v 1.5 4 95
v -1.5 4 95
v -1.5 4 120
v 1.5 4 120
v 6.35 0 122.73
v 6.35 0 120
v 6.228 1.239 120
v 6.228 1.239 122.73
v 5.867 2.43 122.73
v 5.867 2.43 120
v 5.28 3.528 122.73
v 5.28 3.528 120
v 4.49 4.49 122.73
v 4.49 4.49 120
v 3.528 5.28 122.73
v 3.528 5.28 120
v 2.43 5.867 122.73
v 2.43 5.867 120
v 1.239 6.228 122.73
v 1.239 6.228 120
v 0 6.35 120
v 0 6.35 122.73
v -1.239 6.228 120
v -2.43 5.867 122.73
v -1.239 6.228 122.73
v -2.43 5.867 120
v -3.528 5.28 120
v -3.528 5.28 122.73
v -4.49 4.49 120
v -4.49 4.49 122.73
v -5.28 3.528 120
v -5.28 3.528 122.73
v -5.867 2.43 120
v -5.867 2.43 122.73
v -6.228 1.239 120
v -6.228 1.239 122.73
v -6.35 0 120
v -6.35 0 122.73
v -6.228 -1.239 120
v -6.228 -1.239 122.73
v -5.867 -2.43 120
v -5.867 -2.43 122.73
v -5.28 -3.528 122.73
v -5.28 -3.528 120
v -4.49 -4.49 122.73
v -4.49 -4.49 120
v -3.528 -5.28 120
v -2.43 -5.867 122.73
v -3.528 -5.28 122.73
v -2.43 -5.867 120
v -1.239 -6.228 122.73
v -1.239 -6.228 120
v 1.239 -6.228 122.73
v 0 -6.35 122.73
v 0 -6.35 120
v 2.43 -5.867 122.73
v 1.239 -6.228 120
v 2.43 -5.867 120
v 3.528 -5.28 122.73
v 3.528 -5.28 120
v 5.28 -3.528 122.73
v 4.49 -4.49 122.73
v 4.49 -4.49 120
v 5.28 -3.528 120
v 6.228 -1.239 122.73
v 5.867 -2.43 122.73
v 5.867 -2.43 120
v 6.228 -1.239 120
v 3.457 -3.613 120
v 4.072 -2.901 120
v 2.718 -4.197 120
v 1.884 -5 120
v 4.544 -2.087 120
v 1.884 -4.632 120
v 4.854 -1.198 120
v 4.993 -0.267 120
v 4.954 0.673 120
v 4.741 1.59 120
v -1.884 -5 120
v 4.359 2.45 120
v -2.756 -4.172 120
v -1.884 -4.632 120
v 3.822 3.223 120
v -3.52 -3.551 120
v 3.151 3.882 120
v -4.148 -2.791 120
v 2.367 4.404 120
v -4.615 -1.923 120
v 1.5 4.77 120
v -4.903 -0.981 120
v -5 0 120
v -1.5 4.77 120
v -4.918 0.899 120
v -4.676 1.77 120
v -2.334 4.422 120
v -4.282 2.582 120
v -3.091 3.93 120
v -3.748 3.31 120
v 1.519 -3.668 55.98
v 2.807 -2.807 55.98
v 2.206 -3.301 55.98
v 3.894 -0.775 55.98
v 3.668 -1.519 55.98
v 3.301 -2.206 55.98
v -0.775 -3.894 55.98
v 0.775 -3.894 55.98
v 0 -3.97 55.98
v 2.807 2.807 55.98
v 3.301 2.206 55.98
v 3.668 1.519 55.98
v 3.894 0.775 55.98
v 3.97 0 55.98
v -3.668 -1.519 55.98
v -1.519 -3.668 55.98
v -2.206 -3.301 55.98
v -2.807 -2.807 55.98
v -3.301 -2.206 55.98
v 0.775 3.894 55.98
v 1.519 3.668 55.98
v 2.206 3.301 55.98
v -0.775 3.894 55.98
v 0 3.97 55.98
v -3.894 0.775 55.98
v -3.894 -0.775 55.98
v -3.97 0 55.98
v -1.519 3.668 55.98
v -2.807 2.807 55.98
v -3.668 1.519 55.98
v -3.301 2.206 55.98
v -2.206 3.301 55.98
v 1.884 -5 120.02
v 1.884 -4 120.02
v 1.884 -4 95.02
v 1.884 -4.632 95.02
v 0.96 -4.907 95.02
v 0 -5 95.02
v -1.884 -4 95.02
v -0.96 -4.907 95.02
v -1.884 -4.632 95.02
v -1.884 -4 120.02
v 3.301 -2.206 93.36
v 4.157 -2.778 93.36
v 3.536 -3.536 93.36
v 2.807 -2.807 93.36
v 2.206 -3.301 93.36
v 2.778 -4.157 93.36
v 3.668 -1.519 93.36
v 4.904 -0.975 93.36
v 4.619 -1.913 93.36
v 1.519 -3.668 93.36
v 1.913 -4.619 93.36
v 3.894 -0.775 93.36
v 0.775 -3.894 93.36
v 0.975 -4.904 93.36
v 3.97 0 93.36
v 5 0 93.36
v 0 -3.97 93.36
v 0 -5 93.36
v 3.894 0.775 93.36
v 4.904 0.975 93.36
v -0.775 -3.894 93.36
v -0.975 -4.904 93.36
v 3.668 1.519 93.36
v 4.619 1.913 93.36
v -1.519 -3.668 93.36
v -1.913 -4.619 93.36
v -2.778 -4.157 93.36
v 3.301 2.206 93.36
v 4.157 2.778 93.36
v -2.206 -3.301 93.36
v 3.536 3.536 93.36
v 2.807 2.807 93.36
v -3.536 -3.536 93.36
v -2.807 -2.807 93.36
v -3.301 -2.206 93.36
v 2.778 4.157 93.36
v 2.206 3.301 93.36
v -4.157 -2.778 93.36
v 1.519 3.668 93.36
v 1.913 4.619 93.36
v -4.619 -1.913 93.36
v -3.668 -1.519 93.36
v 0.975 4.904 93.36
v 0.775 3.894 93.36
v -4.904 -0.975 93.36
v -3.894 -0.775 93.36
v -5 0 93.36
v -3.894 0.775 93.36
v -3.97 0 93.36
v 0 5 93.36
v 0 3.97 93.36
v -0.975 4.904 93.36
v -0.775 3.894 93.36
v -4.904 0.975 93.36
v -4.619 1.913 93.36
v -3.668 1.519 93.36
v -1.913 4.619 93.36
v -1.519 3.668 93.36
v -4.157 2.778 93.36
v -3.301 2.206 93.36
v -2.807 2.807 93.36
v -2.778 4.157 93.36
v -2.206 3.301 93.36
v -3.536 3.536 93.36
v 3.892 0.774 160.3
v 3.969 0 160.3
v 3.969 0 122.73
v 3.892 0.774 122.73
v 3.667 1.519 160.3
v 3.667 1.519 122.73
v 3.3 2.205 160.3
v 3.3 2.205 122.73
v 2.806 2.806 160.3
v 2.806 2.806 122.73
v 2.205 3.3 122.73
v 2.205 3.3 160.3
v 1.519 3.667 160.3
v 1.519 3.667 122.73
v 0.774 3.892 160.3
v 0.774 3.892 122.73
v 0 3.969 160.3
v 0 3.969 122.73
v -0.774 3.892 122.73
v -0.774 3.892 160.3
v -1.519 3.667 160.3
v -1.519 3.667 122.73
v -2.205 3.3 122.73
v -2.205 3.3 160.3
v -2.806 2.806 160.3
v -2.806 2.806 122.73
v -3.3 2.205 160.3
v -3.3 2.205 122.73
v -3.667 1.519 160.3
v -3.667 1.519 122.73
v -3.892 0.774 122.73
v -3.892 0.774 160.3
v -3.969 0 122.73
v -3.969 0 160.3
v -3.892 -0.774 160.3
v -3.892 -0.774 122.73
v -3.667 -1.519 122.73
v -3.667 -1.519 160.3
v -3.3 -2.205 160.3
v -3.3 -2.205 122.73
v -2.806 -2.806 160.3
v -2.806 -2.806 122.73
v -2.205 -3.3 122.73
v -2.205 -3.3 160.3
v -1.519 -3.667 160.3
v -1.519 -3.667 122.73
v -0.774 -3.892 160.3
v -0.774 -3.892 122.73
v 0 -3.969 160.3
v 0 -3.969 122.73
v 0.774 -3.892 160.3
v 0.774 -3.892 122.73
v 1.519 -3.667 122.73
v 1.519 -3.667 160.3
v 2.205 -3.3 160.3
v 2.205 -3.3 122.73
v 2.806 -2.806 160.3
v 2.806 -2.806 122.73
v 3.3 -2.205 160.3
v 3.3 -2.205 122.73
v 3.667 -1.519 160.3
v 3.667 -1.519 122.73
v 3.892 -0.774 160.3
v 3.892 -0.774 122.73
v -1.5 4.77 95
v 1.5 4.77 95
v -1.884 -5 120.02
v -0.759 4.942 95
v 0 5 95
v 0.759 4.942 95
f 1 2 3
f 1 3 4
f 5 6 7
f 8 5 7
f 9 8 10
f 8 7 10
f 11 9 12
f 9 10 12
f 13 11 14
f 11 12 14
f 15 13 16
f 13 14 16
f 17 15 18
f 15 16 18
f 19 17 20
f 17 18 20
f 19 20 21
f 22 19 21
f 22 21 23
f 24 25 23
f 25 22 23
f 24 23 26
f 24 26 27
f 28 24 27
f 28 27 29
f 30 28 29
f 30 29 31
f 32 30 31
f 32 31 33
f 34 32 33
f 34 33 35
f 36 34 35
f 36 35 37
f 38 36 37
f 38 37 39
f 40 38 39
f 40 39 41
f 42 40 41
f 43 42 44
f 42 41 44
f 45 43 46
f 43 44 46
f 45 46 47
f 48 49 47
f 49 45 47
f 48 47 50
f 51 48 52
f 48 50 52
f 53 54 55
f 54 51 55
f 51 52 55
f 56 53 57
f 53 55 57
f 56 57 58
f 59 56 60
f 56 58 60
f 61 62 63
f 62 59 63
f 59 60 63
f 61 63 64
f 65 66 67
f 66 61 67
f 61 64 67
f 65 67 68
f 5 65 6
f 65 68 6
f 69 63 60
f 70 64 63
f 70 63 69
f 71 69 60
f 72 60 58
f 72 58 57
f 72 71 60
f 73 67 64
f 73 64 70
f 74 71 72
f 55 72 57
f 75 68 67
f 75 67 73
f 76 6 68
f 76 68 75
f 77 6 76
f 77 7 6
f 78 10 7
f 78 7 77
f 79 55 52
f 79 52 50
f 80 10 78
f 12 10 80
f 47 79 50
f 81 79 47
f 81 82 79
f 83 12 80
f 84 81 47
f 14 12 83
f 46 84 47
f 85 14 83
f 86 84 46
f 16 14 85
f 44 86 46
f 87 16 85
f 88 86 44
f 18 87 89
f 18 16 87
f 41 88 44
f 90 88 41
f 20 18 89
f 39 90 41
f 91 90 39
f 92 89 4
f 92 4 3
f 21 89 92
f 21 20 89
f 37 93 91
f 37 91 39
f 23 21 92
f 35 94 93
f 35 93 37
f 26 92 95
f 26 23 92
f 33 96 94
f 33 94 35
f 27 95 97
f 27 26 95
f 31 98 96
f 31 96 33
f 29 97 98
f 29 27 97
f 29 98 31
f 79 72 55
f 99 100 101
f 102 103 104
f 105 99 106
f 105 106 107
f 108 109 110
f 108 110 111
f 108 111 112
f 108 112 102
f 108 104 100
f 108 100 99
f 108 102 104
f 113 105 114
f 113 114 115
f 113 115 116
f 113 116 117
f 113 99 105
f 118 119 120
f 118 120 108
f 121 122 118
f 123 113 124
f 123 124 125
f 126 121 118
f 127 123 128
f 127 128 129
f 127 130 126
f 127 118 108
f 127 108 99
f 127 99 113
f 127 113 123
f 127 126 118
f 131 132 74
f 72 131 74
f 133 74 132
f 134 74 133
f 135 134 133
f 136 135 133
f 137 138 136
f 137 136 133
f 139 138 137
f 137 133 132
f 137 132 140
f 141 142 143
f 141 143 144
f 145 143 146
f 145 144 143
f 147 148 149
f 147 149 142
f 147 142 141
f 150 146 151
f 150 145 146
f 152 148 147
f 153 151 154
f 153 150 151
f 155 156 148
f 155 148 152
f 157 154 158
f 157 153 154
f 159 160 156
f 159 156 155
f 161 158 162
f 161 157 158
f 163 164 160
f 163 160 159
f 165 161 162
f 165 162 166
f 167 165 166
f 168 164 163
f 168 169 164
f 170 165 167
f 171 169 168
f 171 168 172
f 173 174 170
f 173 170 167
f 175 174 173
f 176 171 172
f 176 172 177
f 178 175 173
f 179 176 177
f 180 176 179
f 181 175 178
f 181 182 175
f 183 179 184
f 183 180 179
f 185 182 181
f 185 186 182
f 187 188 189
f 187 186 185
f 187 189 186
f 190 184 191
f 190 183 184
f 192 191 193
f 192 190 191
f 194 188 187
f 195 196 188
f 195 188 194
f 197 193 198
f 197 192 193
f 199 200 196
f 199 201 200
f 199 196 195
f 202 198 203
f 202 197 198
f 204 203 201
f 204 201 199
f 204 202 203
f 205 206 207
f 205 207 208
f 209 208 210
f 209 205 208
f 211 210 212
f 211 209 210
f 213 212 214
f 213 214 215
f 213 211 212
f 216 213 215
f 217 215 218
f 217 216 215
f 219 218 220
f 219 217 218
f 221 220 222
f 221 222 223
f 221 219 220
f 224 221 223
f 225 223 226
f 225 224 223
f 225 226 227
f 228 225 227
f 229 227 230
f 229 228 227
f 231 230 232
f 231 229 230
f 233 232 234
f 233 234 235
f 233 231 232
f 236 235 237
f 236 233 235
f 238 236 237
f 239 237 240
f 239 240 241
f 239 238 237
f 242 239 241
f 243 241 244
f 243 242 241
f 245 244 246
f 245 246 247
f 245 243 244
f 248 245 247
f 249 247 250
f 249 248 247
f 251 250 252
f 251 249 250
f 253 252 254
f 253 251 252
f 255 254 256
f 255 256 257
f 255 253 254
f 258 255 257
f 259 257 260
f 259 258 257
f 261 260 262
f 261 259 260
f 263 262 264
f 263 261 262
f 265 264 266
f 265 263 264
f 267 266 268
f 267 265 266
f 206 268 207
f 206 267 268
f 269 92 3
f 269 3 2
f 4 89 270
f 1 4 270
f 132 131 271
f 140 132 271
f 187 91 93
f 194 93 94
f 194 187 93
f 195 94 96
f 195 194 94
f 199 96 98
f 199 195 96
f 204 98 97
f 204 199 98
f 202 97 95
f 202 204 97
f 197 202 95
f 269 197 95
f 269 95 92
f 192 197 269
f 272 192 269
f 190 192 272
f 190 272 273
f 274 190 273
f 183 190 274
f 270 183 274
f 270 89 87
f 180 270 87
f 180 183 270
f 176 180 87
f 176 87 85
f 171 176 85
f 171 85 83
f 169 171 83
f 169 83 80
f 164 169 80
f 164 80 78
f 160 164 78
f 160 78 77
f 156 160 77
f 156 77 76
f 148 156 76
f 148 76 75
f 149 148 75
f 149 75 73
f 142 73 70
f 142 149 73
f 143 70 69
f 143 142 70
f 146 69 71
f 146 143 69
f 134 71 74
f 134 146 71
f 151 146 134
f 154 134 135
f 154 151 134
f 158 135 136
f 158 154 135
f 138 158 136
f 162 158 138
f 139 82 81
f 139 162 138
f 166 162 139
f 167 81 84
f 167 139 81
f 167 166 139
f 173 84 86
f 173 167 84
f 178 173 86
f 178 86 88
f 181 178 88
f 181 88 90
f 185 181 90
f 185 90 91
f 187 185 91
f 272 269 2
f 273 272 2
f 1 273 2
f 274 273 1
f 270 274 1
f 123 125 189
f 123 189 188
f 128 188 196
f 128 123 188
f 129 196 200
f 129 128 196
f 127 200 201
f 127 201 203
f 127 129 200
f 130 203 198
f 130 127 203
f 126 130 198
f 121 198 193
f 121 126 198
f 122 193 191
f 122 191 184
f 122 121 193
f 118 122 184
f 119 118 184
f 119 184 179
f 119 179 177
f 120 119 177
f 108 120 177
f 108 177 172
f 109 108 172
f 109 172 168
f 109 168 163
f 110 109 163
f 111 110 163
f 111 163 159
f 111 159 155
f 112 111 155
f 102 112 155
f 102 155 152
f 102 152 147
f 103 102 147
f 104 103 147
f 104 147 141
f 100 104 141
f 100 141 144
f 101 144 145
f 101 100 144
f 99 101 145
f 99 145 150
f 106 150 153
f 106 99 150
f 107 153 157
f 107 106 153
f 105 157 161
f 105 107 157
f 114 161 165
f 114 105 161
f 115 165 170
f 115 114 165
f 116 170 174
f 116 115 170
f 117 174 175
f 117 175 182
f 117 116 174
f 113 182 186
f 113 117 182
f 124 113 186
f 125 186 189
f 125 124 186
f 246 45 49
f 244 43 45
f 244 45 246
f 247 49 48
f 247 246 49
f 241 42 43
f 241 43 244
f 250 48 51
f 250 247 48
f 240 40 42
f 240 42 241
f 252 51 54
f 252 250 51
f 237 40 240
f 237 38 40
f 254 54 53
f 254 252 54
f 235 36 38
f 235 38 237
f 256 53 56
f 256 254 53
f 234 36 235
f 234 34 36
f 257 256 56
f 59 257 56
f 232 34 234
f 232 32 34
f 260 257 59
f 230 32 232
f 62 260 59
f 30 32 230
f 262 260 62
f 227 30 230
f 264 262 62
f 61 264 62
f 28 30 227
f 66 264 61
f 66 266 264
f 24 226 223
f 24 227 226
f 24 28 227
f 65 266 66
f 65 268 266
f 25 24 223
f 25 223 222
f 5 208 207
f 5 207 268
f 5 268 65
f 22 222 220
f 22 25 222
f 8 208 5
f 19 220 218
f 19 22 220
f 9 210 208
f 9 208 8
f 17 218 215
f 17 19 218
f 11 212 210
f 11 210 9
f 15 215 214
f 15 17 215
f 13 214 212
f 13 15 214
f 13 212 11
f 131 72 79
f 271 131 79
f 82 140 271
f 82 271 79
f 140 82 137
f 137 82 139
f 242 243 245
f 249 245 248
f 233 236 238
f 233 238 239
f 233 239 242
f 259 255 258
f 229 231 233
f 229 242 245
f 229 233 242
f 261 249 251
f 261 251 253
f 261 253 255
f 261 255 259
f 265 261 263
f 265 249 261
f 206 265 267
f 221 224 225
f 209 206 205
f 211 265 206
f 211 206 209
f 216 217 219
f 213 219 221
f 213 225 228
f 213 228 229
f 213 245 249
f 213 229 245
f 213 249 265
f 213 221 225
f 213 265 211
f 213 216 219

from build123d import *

# Parameters (mm, degrees)
SKETCH1_R           = 6.35
BOSS_EXTRUDE1_DEPTH = 160.3
SKETCH3_OUTSIDE_W   = 46.96
SKETCH3_OUTSIDE_H   = 46.96
SKETCH3_OUTSIDE_R   = 5
CUT_EXTRUDE2_DEPTH  = 120
SKETCH4_OUTSIDE_W   = 46.96
SKETCH4_OUTSIDE_H   = 46.96
SKETCH4_OUTSIDE_R   = 3.96875
CUT_EXTRUDE3_DEPTH  = 37.57
SKETCH5_OUTSIDE_W   = 46.96
SKETCH5_OUTSIDE_H   = 46.96
SKETCH5_OUTSIDE_R   = 3.97
CUT_EXTRUDE4_DEPTH  = 93.36
SKETCH9_W           = 3
SKETCH9_H           = 25
CUT_EXTRUDE6_DEPTH  = 1
SKETCH11_W          = 3.767354336
SKETCH11_H          = 25
CUT_EXTRUDE7_DEPTH  = 1
SKETCH12_R          = 15.914705016
CUT_EXTRUDE8_DEPTH  = 55.98


with BuildPart() as part:
    # Sketch1 → Boss-Extrude1 (new body)
    with BuildSketch(Plane.XY):
        Circle(SKETCH1_R)
    extrude(amount=BOSS_EXTRUDE1_DEPTH)

    # Sketch3 outside → Cut-Extrude2 (cut)
    with BuildSketch(Plane(origin=(0, 0, 0), x_dir=(-1, 0, 0), z_dir=(0, 0, -1))):
        Rectangle(SKETCH3_OUTSIDE_W, SKETCH3_OUTSIDE_H)
        Circle(SKETCH3_OUTSIDE_R, mode=Mode.SUBTRACT)
    extrude(amount=-CUT_EXTRUDE2_DEPTH, mode=Mode.SUBTRACT)

    # Sketch4 outside → Cut-Extrude3 (cut)
    with BuildSketch(Plane.XY.offset(160.3)):
        Rectangle(SKETCH4_OUTSIDE_W, SKETCH4_OUTSIDE_H)
        Circle(SKETCH4_OUTSIDE_R, mode=Mode.SUBTRACT)
    extrude(amount=-CUT_EXTRUDE3_DEPTH, mode=Mode.SUBTRACT)

    # Sketch5 outside → Cut-Extrude4 (cut)
    with BuildSketch(Plane(origin=(0, 0, 0), x_dir=(-1, 0, 0), z_dir=(0, 0, -1))):
        Rectangle(SKETCH5_OUTSIDE_W, SKETCH5_OUTSIDE_H)
        Circle(SKETCH5_OUTSIDE_R, mode=Mode.SUBTRACT)
    extrude(amount=-CUT_EXTRUDE4_DEPTH, mode=Mode.SUBTRACT)

    # Sketch9 → Cut-Extrude6 (cut)
    with BuildSketch(Plane(origin=(0, 5, 0), x_dir=(1, 0, 0), z_dir=(0, 1, 0))):
        with Locations((0, -107.5)):
            Rectangle(SKETCH9_W, SKETCH9_H)
    extrude(amount=-CUT_EXTRUDE6_DEPTH, mode=Mode.SUBTRACT)

    # Sketch11 → Cut-Extrude7 (cut)
    with BuildSketch(Plane(origin=(0, -5, 0), x_dir=(-1, 0, 0), z_dir=(0, -1, 0))):
        with Locations((0, -107.520343873)):
            Rectangle(SKETCH11_W, SKETCH11_H)
    extrude(amount=-CUT_EXTRUDE7_DEPTH, mode=Mode.SUBTRACT)

    # Sketch12 → Cut-Extrude8 (cut)
    with BuildSketch(Plane(origin=(0, 0, 0), x_dir=(-1, 0, 0), z_dir=(0, 0, -1))):
        Circle(SKETCH12_R)
    extrude(amount=-CUT_EXTRUDE8_DEPTH, mode=Mode.SUBTRACT)


solid = part.part
